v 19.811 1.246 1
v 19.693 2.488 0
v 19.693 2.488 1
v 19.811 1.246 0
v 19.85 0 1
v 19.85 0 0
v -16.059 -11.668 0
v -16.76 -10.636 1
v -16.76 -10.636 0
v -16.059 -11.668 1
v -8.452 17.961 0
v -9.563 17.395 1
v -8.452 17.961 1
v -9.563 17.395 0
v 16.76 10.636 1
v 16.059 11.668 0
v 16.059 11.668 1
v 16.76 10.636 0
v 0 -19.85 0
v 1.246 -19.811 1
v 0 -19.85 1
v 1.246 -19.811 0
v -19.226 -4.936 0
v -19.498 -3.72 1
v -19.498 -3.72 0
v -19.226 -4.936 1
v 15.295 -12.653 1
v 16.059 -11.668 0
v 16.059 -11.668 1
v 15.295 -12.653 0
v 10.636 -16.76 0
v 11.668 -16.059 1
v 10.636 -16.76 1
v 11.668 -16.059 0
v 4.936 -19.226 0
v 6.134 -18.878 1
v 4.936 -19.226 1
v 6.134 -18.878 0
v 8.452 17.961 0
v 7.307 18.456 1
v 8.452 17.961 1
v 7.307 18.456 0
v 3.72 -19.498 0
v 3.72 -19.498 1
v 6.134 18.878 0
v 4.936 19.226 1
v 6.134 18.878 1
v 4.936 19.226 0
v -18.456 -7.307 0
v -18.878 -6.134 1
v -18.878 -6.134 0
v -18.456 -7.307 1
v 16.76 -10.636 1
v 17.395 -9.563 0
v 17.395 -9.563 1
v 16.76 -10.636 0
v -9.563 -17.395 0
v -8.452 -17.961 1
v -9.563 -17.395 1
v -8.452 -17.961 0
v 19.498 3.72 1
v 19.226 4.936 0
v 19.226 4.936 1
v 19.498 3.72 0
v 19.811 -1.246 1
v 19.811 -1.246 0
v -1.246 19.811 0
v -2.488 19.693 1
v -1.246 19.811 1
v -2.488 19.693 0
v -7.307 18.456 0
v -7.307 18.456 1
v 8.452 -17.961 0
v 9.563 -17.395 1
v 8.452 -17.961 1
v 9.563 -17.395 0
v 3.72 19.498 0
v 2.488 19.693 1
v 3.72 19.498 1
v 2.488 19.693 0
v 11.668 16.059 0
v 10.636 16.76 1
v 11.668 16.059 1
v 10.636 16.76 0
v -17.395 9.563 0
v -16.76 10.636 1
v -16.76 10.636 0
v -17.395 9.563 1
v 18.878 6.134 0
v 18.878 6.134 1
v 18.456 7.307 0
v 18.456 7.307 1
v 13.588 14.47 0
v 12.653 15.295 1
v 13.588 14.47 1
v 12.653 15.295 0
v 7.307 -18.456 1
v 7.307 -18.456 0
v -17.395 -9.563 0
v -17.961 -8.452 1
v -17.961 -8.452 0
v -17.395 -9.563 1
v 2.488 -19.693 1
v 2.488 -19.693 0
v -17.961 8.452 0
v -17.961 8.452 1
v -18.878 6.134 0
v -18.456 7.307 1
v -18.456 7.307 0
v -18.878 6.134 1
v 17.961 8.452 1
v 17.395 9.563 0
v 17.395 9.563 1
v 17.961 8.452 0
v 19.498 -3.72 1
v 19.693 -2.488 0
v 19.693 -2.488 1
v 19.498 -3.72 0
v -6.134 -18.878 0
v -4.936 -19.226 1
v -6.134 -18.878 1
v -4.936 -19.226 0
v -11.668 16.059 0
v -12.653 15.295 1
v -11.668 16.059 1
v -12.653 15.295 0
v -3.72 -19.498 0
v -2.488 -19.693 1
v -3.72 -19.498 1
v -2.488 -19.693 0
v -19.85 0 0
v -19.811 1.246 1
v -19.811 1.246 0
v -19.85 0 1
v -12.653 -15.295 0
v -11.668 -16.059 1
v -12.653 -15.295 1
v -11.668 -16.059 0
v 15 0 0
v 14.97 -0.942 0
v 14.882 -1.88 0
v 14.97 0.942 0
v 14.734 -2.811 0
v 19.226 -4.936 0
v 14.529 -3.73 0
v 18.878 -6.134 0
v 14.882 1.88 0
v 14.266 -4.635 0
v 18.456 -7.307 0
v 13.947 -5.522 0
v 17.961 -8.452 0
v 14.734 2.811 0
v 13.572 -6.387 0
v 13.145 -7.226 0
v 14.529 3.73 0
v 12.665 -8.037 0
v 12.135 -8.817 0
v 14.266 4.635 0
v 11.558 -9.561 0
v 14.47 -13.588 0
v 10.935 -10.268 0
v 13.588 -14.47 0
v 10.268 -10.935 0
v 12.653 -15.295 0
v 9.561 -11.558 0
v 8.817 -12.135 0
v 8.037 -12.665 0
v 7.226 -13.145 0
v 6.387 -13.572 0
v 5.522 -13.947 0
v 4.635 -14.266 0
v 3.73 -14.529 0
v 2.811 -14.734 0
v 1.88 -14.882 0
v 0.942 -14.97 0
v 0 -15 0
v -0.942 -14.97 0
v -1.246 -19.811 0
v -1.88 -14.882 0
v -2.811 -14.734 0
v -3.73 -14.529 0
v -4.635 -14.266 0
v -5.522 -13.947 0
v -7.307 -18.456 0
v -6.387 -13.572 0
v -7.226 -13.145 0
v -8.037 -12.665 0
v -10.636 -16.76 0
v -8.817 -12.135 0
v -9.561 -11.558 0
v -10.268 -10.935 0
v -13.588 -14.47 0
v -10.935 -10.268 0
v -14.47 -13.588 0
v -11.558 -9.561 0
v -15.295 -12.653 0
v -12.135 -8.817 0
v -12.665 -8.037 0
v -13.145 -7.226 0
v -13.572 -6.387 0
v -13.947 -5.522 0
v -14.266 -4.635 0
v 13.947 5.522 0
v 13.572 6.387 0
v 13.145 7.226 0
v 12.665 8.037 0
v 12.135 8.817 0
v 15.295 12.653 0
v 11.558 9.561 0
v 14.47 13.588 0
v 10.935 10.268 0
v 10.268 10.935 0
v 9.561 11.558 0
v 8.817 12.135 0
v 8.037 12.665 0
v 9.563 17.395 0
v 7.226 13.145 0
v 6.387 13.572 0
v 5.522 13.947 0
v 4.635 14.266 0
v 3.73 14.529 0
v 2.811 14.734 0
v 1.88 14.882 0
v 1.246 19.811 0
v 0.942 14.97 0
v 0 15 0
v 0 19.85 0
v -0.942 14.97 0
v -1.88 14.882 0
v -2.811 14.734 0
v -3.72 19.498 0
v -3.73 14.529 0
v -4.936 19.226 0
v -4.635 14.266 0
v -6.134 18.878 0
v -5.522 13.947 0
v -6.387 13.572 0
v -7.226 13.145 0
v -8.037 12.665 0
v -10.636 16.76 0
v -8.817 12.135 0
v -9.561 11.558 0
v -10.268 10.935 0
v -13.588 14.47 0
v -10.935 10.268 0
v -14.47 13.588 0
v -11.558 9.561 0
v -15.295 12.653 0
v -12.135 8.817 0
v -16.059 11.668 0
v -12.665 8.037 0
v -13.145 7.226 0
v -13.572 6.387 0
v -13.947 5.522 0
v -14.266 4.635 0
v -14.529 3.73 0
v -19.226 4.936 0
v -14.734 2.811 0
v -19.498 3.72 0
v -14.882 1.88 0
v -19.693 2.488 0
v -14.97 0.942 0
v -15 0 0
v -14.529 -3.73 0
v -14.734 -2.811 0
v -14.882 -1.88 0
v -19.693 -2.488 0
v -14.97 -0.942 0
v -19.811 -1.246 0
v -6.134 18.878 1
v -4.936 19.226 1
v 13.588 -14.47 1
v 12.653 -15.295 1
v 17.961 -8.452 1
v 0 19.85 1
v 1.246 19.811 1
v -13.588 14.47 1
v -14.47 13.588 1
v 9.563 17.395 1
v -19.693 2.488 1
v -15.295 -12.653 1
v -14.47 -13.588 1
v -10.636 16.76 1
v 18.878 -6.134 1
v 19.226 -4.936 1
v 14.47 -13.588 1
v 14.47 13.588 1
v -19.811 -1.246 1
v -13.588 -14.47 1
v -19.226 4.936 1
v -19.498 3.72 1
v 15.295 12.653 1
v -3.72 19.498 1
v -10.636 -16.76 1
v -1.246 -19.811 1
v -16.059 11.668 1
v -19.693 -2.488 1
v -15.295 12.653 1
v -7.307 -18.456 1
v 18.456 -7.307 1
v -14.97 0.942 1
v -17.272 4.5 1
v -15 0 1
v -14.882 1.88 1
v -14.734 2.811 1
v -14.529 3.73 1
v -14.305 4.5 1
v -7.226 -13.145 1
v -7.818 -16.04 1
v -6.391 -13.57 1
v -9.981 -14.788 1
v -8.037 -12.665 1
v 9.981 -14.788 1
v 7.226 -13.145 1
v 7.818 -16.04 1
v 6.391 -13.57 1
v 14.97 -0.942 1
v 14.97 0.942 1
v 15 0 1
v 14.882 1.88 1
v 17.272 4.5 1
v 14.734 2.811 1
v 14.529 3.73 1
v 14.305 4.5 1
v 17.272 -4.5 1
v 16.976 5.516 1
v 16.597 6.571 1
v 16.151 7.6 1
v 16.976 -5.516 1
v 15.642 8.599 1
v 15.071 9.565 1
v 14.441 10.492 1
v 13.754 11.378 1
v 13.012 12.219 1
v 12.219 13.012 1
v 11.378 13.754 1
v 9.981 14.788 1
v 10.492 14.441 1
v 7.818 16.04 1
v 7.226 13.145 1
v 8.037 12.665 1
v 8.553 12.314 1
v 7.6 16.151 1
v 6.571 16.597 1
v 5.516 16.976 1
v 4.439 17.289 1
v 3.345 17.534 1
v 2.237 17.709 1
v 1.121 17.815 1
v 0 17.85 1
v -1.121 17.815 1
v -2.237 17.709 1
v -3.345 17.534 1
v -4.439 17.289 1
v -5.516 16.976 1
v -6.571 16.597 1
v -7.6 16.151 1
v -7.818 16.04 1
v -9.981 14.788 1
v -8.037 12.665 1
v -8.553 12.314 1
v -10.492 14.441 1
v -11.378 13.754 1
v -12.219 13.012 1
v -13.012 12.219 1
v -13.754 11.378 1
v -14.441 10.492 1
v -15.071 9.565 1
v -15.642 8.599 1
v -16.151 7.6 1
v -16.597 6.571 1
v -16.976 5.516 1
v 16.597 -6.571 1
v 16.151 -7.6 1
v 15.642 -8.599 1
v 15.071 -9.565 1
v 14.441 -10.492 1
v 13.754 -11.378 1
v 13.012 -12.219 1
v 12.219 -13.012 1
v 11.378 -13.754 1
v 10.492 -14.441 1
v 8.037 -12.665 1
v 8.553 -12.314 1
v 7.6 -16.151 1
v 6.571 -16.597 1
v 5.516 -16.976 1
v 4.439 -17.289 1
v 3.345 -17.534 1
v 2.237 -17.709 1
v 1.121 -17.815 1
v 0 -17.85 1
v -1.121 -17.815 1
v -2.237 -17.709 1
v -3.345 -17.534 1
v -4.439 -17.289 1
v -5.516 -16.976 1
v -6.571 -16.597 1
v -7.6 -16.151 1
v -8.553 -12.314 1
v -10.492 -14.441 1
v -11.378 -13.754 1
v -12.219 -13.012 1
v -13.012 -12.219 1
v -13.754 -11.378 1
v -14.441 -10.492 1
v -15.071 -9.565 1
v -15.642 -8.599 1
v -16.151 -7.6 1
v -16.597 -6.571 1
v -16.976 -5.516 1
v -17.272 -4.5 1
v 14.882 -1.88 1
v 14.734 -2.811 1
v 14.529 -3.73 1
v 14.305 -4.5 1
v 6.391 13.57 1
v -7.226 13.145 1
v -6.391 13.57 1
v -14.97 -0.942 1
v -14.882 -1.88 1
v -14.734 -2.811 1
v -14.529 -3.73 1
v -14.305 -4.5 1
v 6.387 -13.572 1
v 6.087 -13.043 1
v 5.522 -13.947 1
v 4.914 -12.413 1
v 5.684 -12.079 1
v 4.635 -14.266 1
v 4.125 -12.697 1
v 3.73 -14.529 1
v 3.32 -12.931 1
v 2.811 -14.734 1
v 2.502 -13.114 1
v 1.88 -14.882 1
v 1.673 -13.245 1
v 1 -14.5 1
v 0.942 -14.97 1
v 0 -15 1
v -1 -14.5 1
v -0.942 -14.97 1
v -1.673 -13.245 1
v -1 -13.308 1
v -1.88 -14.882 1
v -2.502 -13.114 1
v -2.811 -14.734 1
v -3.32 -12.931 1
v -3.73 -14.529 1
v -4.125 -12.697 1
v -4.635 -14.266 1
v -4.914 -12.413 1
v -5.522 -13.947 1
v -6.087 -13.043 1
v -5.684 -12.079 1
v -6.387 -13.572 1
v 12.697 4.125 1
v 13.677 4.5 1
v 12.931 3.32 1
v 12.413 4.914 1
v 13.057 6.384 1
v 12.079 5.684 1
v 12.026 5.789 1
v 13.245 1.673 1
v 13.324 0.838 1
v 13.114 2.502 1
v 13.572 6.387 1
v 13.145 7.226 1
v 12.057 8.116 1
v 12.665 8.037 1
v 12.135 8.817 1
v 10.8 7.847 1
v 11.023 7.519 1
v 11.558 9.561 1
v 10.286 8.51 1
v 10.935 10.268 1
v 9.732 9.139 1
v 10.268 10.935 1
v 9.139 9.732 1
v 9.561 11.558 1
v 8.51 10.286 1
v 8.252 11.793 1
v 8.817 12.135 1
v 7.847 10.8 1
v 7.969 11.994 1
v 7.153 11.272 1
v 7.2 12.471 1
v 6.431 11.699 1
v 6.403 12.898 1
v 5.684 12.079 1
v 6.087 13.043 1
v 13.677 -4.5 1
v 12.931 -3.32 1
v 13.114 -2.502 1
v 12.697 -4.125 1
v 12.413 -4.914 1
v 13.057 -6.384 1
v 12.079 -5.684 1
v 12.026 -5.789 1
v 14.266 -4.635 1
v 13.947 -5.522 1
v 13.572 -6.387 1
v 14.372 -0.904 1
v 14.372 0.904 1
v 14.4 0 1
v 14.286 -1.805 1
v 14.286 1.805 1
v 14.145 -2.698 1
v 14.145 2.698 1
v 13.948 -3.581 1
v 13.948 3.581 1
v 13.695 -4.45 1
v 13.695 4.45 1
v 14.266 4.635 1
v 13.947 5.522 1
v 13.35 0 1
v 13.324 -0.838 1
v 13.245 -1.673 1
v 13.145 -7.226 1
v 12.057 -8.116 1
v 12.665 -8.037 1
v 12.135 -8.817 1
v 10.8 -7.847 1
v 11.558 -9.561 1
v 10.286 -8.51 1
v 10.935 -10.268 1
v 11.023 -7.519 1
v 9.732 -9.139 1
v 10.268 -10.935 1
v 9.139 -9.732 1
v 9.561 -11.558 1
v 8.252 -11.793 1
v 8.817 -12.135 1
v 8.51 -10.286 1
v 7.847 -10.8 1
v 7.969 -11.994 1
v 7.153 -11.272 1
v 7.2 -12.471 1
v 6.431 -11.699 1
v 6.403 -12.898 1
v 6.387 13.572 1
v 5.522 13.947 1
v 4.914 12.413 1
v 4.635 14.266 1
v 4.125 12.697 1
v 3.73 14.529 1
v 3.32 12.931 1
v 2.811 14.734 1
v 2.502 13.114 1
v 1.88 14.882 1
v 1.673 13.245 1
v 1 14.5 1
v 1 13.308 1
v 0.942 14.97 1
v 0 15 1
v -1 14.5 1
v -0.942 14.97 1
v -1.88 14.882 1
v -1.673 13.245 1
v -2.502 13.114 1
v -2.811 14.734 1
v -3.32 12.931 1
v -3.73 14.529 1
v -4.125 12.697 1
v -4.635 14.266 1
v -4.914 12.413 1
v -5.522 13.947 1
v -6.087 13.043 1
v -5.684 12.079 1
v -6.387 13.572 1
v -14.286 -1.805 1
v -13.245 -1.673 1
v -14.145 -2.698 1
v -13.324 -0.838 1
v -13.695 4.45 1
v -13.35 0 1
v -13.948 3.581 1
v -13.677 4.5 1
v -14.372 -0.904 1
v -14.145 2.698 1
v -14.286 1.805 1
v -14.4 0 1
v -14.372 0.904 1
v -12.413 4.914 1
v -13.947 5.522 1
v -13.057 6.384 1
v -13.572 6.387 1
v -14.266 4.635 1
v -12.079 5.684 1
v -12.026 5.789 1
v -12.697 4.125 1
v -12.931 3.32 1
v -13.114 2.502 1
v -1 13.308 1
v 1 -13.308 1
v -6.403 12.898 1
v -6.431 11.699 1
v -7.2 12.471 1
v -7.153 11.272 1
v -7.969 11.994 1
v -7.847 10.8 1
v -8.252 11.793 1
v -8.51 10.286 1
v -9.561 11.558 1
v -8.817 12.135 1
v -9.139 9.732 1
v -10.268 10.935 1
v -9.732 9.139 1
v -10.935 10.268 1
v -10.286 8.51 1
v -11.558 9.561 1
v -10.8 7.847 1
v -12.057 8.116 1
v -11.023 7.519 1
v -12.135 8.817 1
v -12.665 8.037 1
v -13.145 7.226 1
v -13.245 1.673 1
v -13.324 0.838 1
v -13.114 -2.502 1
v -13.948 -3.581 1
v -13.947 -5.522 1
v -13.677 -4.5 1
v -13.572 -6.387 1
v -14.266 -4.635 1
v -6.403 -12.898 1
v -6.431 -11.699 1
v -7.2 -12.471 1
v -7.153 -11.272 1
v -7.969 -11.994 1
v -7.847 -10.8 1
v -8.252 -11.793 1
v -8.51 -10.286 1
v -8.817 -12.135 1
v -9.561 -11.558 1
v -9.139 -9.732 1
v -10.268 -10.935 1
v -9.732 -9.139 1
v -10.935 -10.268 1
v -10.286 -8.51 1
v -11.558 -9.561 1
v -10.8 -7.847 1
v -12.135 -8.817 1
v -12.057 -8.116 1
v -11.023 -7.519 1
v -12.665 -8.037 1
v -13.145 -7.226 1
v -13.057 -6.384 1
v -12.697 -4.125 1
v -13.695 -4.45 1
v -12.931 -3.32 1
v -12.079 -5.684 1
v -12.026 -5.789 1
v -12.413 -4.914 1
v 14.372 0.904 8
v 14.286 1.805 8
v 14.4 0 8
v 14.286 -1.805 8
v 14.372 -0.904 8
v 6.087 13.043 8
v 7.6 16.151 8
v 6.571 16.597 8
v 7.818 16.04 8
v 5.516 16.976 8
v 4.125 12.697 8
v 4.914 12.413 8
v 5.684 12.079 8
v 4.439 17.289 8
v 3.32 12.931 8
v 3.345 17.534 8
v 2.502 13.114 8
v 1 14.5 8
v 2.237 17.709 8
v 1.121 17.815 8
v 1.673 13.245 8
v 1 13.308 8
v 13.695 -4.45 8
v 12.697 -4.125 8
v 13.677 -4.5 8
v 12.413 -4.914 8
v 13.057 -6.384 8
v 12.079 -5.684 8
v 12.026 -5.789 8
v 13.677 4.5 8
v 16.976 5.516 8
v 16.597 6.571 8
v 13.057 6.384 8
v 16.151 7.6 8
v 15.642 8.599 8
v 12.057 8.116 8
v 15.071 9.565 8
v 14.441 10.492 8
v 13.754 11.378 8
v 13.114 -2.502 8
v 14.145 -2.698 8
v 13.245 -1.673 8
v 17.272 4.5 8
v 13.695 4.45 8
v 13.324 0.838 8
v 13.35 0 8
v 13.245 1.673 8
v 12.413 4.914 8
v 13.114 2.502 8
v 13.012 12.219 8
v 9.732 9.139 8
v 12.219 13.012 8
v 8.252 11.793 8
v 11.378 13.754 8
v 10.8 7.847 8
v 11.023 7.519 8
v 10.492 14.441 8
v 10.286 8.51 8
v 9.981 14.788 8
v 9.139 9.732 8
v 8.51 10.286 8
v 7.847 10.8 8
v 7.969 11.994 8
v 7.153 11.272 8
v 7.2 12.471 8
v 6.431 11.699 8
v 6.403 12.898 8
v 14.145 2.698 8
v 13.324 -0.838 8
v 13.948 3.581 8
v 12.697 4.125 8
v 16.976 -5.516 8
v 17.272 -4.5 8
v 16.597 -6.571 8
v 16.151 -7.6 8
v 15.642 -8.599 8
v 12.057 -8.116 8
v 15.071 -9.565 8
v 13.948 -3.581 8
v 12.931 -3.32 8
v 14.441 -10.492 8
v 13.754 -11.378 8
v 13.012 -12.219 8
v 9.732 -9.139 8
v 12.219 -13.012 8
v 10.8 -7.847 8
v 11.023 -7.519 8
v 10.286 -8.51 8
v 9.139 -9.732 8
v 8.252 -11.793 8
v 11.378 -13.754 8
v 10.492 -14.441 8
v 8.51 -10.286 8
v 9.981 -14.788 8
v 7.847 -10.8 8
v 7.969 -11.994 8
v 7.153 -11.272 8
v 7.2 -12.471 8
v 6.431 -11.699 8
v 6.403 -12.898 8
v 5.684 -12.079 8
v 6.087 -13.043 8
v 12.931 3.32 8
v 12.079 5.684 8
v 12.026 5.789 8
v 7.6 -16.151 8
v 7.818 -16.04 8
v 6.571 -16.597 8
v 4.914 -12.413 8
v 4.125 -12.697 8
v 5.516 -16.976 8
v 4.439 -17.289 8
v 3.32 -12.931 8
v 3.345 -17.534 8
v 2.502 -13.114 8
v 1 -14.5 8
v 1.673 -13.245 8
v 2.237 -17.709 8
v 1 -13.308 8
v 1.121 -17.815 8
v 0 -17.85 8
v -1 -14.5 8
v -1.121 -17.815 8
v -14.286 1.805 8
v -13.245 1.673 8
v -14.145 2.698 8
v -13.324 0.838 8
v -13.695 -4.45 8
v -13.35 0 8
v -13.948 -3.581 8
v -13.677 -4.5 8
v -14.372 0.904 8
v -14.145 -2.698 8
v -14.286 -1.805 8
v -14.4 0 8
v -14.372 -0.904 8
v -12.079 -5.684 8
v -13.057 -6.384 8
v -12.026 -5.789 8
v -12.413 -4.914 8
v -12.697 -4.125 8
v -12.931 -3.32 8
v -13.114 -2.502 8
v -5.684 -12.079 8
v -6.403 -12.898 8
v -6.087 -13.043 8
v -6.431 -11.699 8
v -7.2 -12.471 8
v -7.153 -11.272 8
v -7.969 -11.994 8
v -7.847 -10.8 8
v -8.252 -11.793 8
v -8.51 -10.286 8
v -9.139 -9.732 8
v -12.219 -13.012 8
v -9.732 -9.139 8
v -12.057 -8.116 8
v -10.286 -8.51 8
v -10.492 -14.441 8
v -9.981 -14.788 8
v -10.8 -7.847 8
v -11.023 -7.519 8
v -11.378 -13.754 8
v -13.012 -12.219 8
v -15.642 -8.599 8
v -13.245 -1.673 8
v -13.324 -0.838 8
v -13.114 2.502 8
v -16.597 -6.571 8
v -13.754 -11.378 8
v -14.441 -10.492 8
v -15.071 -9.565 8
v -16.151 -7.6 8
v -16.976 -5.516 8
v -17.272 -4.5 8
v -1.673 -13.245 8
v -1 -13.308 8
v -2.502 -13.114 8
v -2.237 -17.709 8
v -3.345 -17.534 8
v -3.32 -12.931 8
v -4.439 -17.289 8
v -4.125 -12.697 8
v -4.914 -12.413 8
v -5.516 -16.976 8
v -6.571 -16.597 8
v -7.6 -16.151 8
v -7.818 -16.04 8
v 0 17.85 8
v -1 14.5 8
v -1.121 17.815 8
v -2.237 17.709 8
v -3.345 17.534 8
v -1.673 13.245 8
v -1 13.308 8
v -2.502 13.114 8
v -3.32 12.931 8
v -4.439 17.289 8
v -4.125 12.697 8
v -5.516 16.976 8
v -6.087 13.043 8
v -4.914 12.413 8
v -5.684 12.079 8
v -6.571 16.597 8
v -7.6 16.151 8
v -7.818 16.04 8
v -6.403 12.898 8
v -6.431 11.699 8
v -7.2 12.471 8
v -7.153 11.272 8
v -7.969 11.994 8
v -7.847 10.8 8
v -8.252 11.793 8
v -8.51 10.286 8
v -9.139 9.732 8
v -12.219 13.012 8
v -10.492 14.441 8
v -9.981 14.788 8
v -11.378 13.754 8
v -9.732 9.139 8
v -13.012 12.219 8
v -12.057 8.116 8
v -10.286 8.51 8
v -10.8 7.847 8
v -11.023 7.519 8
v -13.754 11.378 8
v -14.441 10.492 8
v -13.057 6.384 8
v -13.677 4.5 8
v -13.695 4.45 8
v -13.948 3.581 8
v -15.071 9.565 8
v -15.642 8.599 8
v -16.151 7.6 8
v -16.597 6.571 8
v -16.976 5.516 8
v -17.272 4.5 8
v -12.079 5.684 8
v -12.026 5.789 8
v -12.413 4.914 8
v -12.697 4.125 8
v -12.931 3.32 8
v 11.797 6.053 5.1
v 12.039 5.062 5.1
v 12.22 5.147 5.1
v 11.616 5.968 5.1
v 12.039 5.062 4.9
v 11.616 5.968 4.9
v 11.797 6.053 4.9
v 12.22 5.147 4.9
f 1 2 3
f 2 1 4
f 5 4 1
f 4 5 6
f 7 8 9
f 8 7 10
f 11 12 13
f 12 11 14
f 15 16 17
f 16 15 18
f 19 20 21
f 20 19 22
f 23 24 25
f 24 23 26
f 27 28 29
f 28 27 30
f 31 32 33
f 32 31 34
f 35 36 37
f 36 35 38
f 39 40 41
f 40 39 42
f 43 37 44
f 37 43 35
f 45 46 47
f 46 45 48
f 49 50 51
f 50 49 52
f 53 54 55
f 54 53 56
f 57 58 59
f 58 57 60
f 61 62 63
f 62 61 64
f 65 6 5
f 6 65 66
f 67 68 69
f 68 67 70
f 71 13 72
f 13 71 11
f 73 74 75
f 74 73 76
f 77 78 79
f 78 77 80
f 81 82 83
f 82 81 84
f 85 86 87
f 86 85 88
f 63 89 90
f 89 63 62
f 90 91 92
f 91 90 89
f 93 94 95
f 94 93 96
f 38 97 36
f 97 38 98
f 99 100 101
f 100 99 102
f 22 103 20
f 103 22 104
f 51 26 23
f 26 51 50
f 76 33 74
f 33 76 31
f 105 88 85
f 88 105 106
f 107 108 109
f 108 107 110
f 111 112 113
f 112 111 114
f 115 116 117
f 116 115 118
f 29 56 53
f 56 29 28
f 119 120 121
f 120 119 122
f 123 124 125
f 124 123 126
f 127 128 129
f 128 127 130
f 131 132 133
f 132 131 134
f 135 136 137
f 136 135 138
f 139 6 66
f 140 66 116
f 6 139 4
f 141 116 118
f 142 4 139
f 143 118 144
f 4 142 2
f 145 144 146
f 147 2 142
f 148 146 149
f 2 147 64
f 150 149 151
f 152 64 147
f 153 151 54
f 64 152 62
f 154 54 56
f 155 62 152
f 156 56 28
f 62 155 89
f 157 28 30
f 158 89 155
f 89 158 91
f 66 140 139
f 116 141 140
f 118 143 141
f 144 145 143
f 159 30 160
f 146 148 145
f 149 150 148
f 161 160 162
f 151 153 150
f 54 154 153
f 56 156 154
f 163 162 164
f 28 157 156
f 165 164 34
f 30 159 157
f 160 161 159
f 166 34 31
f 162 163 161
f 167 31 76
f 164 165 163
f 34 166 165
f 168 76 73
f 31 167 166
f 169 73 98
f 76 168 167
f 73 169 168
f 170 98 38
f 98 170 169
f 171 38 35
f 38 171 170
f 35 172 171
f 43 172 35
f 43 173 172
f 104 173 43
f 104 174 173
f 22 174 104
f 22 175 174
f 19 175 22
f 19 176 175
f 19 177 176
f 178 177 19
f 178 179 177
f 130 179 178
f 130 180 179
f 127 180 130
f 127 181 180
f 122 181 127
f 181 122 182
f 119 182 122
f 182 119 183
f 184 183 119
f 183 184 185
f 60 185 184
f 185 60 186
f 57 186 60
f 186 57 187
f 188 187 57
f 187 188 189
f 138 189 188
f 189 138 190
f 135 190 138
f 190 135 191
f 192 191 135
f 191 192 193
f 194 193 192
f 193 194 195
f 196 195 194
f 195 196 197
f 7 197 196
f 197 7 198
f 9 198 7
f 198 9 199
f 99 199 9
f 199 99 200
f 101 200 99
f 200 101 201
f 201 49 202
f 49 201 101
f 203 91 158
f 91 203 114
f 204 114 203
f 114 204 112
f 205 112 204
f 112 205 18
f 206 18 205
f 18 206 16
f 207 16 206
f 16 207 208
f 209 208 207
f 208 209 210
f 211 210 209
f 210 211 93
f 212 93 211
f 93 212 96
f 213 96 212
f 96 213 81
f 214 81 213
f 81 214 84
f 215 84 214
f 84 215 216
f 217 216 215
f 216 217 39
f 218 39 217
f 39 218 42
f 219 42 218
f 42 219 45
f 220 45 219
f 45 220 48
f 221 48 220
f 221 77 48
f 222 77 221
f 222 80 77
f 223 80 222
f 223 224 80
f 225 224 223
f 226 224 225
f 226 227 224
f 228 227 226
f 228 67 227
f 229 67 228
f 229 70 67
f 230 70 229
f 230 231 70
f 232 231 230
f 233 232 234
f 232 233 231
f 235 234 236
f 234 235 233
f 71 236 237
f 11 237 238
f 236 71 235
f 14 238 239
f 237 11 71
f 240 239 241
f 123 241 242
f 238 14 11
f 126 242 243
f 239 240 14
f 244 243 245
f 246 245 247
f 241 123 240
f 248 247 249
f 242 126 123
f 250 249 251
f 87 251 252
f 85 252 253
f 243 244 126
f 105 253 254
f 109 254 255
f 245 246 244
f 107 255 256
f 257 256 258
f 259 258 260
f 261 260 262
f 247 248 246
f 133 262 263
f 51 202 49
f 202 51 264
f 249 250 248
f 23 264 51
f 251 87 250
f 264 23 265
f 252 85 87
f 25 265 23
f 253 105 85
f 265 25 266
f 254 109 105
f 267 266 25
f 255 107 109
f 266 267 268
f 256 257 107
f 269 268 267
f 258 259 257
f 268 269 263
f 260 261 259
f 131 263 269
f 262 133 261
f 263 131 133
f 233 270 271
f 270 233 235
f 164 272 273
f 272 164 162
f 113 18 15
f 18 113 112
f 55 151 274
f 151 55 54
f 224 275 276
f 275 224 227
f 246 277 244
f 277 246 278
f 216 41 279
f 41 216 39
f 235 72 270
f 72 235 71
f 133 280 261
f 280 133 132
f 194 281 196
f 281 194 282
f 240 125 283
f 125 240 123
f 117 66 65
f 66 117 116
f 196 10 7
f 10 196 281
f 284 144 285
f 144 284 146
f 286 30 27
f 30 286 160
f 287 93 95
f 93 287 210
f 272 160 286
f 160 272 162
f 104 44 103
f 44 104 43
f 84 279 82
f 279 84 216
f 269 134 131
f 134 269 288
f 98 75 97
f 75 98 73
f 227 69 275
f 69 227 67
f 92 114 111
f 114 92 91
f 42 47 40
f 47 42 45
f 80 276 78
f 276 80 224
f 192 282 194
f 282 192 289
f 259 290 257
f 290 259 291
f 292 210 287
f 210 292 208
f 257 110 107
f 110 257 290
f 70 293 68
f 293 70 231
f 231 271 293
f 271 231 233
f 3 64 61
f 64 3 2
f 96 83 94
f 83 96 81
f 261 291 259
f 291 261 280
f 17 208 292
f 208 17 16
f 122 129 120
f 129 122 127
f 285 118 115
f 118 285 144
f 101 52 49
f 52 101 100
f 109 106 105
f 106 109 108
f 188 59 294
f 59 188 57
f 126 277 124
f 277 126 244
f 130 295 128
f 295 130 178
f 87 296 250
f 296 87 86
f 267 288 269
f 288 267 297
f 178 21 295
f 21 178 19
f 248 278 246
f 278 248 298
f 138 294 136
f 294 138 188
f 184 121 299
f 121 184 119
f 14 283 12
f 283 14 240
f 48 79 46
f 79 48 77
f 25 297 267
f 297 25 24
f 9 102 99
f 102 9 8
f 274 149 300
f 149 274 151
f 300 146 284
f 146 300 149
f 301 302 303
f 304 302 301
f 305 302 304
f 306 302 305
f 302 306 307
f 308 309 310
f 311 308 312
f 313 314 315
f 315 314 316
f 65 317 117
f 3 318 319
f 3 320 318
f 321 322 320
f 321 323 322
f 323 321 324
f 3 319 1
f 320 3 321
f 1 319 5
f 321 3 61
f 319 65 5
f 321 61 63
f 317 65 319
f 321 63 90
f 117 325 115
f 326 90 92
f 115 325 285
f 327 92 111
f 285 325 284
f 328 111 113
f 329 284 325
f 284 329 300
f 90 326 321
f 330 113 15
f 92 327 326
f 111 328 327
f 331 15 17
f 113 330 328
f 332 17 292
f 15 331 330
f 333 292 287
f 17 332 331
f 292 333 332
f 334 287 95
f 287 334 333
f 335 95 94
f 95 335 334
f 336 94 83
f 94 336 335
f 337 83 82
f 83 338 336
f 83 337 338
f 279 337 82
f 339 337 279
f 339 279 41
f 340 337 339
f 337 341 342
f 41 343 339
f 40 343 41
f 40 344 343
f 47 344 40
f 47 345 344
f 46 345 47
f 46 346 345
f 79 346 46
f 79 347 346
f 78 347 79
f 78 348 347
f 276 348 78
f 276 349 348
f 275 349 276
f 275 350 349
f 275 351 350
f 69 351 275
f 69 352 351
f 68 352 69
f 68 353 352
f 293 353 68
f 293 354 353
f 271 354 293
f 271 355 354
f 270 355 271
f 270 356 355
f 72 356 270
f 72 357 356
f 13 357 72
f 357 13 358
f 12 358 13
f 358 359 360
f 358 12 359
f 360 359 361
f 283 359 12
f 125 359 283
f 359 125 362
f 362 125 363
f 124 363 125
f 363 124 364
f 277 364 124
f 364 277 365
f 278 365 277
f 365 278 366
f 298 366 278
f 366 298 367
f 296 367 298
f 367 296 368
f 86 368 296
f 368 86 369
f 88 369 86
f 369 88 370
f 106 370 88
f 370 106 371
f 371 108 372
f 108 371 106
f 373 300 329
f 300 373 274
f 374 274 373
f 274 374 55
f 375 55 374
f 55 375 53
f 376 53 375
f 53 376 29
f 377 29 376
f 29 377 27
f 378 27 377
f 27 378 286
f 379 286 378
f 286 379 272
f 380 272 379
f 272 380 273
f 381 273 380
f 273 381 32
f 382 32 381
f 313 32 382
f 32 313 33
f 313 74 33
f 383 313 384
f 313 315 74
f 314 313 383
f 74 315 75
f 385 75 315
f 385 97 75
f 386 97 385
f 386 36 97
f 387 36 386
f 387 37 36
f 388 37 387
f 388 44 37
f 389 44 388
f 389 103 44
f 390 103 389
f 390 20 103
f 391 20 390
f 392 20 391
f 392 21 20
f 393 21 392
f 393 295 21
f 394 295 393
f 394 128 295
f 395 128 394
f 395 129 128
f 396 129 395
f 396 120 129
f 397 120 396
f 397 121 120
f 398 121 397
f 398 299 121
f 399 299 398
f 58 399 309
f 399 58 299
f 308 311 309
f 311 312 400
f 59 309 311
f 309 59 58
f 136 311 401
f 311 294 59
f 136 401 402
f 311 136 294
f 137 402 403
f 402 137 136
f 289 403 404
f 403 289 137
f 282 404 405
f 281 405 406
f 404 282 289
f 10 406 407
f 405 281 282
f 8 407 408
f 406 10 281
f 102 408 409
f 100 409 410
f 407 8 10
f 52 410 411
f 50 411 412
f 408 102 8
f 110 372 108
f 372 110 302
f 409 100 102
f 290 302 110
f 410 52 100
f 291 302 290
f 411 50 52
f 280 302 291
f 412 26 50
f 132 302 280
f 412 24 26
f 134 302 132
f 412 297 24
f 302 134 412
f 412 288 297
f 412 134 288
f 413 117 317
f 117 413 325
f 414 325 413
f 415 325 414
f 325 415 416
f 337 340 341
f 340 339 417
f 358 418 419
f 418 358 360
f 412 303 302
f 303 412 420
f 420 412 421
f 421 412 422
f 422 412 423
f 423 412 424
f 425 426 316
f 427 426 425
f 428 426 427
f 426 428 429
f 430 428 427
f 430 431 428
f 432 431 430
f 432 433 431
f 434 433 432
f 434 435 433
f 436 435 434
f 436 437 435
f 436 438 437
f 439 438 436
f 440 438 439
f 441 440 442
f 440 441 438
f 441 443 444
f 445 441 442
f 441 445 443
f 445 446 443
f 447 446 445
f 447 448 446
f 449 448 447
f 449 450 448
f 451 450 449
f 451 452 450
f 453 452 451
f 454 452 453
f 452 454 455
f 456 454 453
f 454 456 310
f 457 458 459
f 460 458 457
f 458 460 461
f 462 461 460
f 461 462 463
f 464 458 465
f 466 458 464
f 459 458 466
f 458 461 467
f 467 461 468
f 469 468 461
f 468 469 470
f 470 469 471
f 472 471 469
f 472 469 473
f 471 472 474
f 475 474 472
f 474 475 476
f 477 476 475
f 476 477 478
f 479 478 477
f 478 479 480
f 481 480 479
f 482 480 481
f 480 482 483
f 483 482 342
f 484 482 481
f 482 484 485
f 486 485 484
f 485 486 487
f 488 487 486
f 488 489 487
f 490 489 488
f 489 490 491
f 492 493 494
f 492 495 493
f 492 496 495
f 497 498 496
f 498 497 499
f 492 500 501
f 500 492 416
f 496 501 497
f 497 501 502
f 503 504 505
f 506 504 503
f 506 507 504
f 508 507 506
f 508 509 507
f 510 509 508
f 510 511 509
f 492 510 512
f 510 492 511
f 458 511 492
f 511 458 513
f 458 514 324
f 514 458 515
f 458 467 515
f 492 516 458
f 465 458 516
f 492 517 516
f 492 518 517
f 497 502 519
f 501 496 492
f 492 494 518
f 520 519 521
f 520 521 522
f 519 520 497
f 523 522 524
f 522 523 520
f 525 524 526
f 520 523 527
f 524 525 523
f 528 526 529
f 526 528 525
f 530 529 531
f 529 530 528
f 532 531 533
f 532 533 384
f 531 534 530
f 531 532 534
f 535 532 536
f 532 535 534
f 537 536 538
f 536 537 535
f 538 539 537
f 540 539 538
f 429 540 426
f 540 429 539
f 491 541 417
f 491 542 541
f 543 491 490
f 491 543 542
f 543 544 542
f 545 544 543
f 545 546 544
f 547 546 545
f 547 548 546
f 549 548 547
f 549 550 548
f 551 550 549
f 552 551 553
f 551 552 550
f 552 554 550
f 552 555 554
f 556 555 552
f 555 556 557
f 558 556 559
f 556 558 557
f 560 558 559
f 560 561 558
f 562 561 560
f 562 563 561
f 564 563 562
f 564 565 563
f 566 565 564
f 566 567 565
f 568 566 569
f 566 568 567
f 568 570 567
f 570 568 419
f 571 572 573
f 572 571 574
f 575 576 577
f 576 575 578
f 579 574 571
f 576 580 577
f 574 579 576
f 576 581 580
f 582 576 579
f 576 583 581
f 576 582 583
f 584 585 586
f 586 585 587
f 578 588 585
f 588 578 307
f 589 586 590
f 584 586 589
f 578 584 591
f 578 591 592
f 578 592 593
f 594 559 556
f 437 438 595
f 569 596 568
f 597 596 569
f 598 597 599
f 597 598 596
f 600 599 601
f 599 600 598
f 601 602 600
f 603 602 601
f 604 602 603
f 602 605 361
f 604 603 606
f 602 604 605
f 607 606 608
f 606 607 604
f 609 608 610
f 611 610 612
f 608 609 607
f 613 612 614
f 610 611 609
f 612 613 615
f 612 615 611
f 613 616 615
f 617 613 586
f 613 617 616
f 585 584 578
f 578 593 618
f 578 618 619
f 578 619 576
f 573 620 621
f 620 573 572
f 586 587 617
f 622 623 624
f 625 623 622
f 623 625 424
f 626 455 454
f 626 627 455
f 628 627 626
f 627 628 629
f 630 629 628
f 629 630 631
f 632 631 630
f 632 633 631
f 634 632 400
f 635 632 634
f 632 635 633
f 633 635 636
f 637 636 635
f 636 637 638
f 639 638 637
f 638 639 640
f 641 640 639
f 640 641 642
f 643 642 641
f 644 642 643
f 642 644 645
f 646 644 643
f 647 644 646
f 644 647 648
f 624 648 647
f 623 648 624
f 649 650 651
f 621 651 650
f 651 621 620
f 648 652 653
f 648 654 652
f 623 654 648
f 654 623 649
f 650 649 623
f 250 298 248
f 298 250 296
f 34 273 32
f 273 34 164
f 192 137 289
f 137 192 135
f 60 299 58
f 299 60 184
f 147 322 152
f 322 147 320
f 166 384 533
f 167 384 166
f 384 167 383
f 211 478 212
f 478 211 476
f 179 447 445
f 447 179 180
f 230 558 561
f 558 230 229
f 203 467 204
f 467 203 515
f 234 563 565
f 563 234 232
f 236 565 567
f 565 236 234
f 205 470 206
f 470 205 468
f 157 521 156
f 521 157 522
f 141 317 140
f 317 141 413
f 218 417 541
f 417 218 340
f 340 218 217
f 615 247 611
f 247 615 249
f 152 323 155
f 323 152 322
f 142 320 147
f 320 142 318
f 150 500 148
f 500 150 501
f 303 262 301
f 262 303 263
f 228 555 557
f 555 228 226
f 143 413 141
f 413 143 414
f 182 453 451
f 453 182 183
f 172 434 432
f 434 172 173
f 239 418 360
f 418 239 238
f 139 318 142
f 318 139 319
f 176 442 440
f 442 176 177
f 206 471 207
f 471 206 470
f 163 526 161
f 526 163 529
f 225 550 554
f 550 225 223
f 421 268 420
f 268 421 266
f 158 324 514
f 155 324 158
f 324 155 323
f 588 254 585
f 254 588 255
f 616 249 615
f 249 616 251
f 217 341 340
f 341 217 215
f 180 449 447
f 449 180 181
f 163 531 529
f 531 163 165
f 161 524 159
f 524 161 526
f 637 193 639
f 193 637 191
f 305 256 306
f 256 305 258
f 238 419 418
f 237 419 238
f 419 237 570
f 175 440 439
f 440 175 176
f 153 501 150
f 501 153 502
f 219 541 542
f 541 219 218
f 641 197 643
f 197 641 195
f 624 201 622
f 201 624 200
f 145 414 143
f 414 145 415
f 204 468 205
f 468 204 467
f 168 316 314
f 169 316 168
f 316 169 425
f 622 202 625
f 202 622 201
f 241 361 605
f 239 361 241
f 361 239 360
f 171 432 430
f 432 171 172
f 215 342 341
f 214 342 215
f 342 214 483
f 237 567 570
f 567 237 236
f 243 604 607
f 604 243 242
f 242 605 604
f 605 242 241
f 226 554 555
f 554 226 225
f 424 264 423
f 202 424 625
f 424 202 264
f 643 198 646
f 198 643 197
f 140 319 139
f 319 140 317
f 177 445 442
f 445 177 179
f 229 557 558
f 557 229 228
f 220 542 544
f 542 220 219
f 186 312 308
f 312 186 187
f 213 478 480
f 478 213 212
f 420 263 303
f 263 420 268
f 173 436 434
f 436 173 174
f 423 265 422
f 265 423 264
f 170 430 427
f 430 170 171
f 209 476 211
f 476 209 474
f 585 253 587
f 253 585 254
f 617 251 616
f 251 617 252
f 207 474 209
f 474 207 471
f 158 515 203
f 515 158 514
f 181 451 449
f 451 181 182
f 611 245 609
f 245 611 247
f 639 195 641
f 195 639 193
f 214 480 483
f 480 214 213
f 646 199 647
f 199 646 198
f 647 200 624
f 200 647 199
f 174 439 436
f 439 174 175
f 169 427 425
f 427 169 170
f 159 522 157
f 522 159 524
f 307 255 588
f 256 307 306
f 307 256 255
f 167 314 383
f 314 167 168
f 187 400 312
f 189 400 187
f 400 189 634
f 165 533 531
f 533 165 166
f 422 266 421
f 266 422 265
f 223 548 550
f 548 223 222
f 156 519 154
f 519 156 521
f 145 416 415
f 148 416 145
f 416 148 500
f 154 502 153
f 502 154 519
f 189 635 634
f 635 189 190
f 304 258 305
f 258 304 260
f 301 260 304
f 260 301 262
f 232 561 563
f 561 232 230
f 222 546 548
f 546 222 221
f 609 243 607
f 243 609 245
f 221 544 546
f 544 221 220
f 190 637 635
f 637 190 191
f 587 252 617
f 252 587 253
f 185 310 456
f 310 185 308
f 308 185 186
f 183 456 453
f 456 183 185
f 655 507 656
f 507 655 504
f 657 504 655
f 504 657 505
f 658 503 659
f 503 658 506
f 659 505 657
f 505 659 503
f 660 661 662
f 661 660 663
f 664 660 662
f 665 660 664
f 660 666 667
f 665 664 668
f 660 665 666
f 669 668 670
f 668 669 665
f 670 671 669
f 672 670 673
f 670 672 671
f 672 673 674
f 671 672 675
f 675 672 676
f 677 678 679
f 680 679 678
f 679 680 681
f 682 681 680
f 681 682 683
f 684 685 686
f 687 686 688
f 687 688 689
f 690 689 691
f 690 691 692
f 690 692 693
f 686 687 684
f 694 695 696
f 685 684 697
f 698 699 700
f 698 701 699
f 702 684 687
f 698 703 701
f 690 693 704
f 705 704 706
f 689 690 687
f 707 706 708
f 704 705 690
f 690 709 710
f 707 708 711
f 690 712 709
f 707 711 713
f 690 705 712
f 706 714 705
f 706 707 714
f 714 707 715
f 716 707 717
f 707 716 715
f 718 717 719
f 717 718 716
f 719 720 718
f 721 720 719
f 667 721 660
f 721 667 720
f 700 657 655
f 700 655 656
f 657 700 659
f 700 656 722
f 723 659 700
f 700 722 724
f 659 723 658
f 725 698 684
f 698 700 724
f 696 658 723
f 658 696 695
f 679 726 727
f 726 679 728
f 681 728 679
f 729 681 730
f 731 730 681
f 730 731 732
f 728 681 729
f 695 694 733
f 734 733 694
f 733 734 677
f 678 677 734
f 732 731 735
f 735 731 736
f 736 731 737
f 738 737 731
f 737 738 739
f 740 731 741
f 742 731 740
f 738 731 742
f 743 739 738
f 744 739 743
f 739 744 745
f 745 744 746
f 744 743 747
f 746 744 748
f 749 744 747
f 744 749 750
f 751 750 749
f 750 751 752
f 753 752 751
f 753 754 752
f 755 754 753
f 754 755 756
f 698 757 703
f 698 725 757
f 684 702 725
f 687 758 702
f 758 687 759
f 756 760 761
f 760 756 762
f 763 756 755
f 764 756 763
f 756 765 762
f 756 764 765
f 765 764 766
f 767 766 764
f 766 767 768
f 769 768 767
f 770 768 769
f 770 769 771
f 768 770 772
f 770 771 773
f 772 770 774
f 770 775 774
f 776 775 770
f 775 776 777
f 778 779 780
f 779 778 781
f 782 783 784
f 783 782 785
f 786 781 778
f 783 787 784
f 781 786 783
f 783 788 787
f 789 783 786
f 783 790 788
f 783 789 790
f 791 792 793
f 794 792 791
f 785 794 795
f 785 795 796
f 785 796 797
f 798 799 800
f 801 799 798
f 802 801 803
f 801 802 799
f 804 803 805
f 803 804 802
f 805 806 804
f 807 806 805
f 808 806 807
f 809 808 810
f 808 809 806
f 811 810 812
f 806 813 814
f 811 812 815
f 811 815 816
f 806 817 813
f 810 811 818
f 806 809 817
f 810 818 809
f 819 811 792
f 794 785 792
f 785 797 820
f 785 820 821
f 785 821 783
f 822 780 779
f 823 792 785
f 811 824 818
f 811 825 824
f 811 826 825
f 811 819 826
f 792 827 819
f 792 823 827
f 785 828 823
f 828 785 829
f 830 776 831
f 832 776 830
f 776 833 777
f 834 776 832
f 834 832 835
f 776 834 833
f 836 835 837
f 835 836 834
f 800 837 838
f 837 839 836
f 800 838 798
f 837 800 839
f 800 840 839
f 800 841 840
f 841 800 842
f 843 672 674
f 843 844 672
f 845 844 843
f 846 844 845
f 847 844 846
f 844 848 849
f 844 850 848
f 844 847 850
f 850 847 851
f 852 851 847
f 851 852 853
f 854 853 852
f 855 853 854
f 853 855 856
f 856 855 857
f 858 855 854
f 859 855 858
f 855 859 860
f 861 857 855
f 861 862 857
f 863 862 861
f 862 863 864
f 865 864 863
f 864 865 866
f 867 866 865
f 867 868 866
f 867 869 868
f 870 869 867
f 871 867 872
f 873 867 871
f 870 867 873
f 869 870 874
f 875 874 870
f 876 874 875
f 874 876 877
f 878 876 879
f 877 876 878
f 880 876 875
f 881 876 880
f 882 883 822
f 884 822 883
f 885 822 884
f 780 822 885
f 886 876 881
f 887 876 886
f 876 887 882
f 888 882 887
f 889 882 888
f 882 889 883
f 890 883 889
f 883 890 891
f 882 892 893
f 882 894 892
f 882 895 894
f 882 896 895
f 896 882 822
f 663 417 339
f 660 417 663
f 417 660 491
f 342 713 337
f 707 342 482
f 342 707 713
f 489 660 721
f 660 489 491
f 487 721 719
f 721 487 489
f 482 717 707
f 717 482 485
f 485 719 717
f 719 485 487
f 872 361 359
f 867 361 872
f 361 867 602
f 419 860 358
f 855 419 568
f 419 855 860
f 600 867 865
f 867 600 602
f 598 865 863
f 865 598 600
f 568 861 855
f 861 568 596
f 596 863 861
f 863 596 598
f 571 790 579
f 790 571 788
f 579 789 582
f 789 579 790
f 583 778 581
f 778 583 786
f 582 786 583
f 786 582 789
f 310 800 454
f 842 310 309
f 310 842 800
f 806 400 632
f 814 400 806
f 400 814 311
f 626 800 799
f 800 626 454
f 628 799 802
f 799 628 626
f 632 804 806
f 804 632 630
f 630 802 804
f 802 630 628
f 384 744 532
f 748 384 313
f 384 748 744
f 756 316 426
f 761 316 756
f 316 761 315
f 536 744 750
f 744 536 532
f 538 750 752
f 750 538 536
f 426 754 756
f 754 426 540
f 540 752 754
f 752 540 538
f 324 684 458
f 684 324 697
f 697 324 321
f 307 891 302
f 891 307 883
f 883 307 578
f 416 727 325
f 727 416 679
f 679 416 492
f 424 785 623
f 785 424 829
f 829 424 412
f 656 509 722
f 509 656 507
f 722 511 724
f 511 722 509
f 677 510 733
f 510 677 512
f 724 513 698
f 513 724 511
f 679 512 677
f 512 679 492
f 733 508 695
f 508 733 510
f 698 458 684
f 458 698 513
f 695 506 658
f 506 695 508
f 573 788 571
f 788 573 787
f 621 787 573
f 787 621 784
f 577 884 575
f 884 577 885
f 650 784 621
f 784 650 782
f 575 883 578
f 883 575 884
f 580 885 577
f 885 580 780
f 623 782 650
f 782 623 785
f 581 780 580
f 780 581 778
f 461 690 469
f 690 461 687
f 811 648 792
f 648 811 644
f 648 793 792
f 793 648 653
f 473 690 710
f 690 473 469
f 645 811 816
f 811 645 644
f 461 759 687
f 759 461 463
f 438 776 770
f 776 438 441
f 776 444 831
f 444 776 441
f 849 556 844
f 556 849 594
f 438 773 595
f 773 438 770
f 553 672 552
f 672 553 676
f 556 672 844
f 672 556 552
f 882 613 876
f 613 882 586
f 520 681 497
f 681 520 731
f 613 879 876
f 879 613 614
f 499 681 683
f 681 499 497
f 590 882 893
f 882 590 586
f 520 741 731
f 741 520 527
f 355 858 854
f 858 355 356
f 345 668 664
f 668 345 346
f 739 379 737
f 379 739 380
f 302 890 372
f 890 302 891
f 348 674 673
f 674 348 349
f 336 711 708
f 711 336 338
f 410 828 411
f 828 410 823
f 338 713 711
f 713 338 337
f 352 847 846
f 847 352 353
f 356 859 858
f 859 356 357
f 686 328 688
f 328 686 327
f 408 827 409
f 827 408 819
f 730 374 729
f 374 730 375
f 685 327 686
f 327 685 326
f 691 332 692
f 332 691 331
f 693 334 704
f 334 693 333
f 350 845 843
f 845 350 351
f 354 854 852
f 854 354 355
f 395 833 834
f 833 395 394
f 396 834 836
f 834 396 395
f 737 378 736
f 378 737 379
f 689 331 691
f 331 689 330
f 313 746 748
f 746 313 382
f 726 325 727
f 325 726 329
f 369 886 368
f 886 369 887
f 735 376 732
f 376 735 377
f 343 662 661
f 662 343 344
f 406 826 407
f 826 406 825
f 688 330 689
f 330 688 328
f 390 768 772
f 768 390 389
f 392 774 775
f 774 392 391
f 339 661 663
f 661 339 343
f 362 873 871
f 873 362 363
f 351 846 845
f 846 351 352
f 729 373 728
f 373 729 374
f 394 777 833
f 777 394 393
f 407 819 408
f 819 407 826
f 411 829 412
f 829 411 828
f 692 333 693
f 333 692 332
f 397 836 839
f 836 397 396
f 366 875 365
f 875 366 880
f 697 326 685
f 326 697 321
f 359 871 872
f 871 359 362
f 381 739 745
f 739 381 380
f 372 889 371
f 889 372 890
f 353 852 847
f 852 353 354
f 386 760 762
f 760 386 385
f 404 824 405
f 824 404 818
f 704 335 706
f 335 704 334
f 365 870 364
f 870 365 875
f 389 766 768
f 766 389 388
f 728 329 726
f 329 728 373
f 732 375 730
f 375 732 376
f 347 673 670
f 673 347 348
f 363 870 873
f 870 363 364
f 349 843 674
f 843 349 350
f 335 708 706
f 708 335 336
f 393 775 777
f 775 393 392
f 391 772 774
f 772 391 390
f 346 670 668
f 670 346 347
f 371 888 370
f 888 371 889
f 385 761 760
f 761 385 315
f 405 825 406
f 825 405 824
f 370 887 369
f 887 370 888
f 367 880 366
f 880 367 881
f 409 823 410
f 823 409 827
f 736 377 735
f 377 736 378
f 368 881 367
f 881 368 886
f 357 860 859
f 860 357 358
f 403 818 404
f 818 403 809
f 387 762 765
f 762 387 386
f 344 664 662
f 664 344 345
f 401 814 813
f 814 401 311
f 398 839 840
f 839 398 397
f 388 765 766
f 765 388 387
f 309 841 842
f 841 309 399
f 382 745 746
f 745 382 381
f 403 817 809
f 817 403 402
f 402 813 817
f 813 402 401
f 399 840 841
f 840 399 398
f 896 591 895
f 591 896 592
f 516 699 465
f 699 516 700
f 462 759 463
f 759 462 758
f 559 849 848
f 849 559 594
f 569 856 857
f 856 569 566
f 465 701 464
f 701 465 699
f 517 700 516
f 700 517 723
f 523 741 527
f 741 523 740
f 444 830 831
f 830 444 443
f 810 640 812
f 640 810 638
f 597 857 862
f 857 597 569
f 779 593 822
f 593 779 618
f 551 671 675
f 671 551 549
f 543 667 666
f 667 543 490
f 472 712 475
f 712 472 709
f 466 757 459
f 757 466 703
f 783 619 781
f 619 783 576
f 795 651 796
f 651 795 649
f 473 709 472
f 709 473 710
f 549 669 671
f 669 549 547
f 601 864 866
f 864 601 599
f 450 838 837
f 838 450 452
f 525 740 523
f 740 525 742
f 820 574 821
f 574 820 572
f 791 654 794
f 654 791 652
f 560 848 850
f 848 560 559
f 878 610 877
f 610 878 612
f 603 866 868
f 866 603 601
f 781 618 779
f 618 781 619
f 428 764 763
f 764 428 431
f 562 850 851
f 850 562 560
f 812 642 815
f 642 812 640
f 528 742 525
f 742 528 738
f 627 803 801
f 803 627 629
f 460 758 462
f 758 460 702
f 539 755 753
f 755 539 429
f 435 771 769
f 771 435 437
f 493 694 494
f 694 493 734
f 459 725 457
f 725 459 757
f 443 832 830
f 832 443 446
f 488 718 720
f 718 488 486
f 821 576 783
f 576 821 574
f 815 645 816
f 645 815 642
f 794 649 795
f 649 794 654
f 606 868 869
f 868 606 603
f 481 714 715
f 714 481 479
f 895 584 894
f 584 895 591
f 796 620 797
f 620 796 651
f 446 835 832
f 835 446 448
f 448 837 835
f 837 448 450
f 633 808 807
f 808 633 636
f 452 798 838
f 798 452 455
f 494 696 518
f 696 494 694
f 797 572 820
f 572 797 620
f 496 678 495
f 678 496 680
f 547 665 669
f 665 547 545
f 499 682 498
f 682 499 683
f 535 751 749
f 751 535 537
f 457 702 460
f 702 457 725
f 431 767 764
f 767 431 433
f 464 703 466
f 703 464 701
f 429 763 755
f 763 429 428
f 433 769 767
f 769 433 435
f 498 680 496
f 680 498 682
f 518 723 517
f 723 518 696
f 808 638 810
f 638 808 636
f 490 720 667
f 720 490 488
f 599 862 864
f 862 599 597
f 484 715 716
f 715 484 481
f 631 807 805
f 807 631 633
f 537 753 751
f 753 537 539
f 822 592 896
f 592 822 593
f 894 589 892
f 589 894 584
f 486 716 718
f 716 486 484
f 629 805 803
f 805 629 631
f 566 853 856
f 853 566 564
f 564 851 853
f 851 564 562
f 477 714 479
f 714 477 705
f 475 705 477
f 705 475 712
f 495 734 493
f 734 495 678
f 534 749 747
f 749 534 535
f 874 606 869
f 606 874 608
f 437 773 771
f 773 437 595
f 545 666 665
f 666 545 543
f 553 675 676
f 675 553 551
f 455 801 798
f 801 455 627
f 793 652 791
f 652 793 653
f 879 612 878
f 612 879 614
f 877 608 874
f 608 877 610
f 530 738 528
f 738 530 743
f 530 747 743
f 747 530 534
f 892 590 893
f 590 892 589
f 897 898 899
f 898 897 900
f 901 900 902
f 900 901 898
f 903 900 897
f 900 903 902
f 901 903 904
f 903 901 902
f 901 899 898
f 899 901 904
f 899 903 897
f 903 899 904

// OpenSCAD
$fn=100;

inner_dia = 26.7;
inner_fin_dia = 29;

flange_dia = 30;
flange_height = 1;
flange_extra = 2;

height = 7;
fin_width = 2;
fin_count = 6;
blind_fin_dia = 28.8;
blind_fin_width = 2.5;
blind_big_fin_width = 9;
outer_dia = 35.7;

notch_depth = .2;
notch_width = 1;
notch_height = 5;

// Flange
difference () {
    cylinder (h = flange_height, d=outer_dia + flange_extra * 2, center = false);
    translate([0,0,-.1]) cylinder (h = height, d=flange_dia, center = false);
}
translate([0,0,flange_height]) {
difference () {
    union() {
        cylinder (h = height, d=outer_dia, center = false);
    }
    // Remove the main inner cylinder
    cylinder (h = height*3, d=inner_dia, center = true);
    // Remove the blind fins
    for (a = [0: 360 / fin_count : 360-1]) {
        rotate (a) {
            difference() {
                translate([0, -blind_fin_width/ 2, -.1]) {
                    cube ([outer_dia, blind_fin_width, height+.2]);
                }
                cylinder (h = height, d=blind_fin_dia, center = false);
            }
        }
    }
        // Remove the blind big fins
    for (a = [0: 360 / 2: 360-1]) {
        rotate (a) {
            difference() {
                translate([0, -blind_big_fin_width/ 2, -.1]) {
                    cube ([outer_dia, blind_big_fin_width, height+.2]);
                }
                cylinder (h = height, d=blind_fin_dia, center = false);
            }
        }
    }

    // Remove the motor inner fins
    for (a = [360 / fin_count/2: 360 / fin_count : 179]) {
        rotate (a) {
            translate([-inner_fin_dia / 2, -fin_width / 2, -.1]) {
                cube ([inner_fin_dia, fin_width, height+.2]);
            }
        }
    }
}}

color("Blue"){
rotate(25) {translate([(inner_dia / 2)-notch_depth, 0, notch_height]) {
    cube([notch_depth, notch_width, notch_depth], center=true);
    }
}}
